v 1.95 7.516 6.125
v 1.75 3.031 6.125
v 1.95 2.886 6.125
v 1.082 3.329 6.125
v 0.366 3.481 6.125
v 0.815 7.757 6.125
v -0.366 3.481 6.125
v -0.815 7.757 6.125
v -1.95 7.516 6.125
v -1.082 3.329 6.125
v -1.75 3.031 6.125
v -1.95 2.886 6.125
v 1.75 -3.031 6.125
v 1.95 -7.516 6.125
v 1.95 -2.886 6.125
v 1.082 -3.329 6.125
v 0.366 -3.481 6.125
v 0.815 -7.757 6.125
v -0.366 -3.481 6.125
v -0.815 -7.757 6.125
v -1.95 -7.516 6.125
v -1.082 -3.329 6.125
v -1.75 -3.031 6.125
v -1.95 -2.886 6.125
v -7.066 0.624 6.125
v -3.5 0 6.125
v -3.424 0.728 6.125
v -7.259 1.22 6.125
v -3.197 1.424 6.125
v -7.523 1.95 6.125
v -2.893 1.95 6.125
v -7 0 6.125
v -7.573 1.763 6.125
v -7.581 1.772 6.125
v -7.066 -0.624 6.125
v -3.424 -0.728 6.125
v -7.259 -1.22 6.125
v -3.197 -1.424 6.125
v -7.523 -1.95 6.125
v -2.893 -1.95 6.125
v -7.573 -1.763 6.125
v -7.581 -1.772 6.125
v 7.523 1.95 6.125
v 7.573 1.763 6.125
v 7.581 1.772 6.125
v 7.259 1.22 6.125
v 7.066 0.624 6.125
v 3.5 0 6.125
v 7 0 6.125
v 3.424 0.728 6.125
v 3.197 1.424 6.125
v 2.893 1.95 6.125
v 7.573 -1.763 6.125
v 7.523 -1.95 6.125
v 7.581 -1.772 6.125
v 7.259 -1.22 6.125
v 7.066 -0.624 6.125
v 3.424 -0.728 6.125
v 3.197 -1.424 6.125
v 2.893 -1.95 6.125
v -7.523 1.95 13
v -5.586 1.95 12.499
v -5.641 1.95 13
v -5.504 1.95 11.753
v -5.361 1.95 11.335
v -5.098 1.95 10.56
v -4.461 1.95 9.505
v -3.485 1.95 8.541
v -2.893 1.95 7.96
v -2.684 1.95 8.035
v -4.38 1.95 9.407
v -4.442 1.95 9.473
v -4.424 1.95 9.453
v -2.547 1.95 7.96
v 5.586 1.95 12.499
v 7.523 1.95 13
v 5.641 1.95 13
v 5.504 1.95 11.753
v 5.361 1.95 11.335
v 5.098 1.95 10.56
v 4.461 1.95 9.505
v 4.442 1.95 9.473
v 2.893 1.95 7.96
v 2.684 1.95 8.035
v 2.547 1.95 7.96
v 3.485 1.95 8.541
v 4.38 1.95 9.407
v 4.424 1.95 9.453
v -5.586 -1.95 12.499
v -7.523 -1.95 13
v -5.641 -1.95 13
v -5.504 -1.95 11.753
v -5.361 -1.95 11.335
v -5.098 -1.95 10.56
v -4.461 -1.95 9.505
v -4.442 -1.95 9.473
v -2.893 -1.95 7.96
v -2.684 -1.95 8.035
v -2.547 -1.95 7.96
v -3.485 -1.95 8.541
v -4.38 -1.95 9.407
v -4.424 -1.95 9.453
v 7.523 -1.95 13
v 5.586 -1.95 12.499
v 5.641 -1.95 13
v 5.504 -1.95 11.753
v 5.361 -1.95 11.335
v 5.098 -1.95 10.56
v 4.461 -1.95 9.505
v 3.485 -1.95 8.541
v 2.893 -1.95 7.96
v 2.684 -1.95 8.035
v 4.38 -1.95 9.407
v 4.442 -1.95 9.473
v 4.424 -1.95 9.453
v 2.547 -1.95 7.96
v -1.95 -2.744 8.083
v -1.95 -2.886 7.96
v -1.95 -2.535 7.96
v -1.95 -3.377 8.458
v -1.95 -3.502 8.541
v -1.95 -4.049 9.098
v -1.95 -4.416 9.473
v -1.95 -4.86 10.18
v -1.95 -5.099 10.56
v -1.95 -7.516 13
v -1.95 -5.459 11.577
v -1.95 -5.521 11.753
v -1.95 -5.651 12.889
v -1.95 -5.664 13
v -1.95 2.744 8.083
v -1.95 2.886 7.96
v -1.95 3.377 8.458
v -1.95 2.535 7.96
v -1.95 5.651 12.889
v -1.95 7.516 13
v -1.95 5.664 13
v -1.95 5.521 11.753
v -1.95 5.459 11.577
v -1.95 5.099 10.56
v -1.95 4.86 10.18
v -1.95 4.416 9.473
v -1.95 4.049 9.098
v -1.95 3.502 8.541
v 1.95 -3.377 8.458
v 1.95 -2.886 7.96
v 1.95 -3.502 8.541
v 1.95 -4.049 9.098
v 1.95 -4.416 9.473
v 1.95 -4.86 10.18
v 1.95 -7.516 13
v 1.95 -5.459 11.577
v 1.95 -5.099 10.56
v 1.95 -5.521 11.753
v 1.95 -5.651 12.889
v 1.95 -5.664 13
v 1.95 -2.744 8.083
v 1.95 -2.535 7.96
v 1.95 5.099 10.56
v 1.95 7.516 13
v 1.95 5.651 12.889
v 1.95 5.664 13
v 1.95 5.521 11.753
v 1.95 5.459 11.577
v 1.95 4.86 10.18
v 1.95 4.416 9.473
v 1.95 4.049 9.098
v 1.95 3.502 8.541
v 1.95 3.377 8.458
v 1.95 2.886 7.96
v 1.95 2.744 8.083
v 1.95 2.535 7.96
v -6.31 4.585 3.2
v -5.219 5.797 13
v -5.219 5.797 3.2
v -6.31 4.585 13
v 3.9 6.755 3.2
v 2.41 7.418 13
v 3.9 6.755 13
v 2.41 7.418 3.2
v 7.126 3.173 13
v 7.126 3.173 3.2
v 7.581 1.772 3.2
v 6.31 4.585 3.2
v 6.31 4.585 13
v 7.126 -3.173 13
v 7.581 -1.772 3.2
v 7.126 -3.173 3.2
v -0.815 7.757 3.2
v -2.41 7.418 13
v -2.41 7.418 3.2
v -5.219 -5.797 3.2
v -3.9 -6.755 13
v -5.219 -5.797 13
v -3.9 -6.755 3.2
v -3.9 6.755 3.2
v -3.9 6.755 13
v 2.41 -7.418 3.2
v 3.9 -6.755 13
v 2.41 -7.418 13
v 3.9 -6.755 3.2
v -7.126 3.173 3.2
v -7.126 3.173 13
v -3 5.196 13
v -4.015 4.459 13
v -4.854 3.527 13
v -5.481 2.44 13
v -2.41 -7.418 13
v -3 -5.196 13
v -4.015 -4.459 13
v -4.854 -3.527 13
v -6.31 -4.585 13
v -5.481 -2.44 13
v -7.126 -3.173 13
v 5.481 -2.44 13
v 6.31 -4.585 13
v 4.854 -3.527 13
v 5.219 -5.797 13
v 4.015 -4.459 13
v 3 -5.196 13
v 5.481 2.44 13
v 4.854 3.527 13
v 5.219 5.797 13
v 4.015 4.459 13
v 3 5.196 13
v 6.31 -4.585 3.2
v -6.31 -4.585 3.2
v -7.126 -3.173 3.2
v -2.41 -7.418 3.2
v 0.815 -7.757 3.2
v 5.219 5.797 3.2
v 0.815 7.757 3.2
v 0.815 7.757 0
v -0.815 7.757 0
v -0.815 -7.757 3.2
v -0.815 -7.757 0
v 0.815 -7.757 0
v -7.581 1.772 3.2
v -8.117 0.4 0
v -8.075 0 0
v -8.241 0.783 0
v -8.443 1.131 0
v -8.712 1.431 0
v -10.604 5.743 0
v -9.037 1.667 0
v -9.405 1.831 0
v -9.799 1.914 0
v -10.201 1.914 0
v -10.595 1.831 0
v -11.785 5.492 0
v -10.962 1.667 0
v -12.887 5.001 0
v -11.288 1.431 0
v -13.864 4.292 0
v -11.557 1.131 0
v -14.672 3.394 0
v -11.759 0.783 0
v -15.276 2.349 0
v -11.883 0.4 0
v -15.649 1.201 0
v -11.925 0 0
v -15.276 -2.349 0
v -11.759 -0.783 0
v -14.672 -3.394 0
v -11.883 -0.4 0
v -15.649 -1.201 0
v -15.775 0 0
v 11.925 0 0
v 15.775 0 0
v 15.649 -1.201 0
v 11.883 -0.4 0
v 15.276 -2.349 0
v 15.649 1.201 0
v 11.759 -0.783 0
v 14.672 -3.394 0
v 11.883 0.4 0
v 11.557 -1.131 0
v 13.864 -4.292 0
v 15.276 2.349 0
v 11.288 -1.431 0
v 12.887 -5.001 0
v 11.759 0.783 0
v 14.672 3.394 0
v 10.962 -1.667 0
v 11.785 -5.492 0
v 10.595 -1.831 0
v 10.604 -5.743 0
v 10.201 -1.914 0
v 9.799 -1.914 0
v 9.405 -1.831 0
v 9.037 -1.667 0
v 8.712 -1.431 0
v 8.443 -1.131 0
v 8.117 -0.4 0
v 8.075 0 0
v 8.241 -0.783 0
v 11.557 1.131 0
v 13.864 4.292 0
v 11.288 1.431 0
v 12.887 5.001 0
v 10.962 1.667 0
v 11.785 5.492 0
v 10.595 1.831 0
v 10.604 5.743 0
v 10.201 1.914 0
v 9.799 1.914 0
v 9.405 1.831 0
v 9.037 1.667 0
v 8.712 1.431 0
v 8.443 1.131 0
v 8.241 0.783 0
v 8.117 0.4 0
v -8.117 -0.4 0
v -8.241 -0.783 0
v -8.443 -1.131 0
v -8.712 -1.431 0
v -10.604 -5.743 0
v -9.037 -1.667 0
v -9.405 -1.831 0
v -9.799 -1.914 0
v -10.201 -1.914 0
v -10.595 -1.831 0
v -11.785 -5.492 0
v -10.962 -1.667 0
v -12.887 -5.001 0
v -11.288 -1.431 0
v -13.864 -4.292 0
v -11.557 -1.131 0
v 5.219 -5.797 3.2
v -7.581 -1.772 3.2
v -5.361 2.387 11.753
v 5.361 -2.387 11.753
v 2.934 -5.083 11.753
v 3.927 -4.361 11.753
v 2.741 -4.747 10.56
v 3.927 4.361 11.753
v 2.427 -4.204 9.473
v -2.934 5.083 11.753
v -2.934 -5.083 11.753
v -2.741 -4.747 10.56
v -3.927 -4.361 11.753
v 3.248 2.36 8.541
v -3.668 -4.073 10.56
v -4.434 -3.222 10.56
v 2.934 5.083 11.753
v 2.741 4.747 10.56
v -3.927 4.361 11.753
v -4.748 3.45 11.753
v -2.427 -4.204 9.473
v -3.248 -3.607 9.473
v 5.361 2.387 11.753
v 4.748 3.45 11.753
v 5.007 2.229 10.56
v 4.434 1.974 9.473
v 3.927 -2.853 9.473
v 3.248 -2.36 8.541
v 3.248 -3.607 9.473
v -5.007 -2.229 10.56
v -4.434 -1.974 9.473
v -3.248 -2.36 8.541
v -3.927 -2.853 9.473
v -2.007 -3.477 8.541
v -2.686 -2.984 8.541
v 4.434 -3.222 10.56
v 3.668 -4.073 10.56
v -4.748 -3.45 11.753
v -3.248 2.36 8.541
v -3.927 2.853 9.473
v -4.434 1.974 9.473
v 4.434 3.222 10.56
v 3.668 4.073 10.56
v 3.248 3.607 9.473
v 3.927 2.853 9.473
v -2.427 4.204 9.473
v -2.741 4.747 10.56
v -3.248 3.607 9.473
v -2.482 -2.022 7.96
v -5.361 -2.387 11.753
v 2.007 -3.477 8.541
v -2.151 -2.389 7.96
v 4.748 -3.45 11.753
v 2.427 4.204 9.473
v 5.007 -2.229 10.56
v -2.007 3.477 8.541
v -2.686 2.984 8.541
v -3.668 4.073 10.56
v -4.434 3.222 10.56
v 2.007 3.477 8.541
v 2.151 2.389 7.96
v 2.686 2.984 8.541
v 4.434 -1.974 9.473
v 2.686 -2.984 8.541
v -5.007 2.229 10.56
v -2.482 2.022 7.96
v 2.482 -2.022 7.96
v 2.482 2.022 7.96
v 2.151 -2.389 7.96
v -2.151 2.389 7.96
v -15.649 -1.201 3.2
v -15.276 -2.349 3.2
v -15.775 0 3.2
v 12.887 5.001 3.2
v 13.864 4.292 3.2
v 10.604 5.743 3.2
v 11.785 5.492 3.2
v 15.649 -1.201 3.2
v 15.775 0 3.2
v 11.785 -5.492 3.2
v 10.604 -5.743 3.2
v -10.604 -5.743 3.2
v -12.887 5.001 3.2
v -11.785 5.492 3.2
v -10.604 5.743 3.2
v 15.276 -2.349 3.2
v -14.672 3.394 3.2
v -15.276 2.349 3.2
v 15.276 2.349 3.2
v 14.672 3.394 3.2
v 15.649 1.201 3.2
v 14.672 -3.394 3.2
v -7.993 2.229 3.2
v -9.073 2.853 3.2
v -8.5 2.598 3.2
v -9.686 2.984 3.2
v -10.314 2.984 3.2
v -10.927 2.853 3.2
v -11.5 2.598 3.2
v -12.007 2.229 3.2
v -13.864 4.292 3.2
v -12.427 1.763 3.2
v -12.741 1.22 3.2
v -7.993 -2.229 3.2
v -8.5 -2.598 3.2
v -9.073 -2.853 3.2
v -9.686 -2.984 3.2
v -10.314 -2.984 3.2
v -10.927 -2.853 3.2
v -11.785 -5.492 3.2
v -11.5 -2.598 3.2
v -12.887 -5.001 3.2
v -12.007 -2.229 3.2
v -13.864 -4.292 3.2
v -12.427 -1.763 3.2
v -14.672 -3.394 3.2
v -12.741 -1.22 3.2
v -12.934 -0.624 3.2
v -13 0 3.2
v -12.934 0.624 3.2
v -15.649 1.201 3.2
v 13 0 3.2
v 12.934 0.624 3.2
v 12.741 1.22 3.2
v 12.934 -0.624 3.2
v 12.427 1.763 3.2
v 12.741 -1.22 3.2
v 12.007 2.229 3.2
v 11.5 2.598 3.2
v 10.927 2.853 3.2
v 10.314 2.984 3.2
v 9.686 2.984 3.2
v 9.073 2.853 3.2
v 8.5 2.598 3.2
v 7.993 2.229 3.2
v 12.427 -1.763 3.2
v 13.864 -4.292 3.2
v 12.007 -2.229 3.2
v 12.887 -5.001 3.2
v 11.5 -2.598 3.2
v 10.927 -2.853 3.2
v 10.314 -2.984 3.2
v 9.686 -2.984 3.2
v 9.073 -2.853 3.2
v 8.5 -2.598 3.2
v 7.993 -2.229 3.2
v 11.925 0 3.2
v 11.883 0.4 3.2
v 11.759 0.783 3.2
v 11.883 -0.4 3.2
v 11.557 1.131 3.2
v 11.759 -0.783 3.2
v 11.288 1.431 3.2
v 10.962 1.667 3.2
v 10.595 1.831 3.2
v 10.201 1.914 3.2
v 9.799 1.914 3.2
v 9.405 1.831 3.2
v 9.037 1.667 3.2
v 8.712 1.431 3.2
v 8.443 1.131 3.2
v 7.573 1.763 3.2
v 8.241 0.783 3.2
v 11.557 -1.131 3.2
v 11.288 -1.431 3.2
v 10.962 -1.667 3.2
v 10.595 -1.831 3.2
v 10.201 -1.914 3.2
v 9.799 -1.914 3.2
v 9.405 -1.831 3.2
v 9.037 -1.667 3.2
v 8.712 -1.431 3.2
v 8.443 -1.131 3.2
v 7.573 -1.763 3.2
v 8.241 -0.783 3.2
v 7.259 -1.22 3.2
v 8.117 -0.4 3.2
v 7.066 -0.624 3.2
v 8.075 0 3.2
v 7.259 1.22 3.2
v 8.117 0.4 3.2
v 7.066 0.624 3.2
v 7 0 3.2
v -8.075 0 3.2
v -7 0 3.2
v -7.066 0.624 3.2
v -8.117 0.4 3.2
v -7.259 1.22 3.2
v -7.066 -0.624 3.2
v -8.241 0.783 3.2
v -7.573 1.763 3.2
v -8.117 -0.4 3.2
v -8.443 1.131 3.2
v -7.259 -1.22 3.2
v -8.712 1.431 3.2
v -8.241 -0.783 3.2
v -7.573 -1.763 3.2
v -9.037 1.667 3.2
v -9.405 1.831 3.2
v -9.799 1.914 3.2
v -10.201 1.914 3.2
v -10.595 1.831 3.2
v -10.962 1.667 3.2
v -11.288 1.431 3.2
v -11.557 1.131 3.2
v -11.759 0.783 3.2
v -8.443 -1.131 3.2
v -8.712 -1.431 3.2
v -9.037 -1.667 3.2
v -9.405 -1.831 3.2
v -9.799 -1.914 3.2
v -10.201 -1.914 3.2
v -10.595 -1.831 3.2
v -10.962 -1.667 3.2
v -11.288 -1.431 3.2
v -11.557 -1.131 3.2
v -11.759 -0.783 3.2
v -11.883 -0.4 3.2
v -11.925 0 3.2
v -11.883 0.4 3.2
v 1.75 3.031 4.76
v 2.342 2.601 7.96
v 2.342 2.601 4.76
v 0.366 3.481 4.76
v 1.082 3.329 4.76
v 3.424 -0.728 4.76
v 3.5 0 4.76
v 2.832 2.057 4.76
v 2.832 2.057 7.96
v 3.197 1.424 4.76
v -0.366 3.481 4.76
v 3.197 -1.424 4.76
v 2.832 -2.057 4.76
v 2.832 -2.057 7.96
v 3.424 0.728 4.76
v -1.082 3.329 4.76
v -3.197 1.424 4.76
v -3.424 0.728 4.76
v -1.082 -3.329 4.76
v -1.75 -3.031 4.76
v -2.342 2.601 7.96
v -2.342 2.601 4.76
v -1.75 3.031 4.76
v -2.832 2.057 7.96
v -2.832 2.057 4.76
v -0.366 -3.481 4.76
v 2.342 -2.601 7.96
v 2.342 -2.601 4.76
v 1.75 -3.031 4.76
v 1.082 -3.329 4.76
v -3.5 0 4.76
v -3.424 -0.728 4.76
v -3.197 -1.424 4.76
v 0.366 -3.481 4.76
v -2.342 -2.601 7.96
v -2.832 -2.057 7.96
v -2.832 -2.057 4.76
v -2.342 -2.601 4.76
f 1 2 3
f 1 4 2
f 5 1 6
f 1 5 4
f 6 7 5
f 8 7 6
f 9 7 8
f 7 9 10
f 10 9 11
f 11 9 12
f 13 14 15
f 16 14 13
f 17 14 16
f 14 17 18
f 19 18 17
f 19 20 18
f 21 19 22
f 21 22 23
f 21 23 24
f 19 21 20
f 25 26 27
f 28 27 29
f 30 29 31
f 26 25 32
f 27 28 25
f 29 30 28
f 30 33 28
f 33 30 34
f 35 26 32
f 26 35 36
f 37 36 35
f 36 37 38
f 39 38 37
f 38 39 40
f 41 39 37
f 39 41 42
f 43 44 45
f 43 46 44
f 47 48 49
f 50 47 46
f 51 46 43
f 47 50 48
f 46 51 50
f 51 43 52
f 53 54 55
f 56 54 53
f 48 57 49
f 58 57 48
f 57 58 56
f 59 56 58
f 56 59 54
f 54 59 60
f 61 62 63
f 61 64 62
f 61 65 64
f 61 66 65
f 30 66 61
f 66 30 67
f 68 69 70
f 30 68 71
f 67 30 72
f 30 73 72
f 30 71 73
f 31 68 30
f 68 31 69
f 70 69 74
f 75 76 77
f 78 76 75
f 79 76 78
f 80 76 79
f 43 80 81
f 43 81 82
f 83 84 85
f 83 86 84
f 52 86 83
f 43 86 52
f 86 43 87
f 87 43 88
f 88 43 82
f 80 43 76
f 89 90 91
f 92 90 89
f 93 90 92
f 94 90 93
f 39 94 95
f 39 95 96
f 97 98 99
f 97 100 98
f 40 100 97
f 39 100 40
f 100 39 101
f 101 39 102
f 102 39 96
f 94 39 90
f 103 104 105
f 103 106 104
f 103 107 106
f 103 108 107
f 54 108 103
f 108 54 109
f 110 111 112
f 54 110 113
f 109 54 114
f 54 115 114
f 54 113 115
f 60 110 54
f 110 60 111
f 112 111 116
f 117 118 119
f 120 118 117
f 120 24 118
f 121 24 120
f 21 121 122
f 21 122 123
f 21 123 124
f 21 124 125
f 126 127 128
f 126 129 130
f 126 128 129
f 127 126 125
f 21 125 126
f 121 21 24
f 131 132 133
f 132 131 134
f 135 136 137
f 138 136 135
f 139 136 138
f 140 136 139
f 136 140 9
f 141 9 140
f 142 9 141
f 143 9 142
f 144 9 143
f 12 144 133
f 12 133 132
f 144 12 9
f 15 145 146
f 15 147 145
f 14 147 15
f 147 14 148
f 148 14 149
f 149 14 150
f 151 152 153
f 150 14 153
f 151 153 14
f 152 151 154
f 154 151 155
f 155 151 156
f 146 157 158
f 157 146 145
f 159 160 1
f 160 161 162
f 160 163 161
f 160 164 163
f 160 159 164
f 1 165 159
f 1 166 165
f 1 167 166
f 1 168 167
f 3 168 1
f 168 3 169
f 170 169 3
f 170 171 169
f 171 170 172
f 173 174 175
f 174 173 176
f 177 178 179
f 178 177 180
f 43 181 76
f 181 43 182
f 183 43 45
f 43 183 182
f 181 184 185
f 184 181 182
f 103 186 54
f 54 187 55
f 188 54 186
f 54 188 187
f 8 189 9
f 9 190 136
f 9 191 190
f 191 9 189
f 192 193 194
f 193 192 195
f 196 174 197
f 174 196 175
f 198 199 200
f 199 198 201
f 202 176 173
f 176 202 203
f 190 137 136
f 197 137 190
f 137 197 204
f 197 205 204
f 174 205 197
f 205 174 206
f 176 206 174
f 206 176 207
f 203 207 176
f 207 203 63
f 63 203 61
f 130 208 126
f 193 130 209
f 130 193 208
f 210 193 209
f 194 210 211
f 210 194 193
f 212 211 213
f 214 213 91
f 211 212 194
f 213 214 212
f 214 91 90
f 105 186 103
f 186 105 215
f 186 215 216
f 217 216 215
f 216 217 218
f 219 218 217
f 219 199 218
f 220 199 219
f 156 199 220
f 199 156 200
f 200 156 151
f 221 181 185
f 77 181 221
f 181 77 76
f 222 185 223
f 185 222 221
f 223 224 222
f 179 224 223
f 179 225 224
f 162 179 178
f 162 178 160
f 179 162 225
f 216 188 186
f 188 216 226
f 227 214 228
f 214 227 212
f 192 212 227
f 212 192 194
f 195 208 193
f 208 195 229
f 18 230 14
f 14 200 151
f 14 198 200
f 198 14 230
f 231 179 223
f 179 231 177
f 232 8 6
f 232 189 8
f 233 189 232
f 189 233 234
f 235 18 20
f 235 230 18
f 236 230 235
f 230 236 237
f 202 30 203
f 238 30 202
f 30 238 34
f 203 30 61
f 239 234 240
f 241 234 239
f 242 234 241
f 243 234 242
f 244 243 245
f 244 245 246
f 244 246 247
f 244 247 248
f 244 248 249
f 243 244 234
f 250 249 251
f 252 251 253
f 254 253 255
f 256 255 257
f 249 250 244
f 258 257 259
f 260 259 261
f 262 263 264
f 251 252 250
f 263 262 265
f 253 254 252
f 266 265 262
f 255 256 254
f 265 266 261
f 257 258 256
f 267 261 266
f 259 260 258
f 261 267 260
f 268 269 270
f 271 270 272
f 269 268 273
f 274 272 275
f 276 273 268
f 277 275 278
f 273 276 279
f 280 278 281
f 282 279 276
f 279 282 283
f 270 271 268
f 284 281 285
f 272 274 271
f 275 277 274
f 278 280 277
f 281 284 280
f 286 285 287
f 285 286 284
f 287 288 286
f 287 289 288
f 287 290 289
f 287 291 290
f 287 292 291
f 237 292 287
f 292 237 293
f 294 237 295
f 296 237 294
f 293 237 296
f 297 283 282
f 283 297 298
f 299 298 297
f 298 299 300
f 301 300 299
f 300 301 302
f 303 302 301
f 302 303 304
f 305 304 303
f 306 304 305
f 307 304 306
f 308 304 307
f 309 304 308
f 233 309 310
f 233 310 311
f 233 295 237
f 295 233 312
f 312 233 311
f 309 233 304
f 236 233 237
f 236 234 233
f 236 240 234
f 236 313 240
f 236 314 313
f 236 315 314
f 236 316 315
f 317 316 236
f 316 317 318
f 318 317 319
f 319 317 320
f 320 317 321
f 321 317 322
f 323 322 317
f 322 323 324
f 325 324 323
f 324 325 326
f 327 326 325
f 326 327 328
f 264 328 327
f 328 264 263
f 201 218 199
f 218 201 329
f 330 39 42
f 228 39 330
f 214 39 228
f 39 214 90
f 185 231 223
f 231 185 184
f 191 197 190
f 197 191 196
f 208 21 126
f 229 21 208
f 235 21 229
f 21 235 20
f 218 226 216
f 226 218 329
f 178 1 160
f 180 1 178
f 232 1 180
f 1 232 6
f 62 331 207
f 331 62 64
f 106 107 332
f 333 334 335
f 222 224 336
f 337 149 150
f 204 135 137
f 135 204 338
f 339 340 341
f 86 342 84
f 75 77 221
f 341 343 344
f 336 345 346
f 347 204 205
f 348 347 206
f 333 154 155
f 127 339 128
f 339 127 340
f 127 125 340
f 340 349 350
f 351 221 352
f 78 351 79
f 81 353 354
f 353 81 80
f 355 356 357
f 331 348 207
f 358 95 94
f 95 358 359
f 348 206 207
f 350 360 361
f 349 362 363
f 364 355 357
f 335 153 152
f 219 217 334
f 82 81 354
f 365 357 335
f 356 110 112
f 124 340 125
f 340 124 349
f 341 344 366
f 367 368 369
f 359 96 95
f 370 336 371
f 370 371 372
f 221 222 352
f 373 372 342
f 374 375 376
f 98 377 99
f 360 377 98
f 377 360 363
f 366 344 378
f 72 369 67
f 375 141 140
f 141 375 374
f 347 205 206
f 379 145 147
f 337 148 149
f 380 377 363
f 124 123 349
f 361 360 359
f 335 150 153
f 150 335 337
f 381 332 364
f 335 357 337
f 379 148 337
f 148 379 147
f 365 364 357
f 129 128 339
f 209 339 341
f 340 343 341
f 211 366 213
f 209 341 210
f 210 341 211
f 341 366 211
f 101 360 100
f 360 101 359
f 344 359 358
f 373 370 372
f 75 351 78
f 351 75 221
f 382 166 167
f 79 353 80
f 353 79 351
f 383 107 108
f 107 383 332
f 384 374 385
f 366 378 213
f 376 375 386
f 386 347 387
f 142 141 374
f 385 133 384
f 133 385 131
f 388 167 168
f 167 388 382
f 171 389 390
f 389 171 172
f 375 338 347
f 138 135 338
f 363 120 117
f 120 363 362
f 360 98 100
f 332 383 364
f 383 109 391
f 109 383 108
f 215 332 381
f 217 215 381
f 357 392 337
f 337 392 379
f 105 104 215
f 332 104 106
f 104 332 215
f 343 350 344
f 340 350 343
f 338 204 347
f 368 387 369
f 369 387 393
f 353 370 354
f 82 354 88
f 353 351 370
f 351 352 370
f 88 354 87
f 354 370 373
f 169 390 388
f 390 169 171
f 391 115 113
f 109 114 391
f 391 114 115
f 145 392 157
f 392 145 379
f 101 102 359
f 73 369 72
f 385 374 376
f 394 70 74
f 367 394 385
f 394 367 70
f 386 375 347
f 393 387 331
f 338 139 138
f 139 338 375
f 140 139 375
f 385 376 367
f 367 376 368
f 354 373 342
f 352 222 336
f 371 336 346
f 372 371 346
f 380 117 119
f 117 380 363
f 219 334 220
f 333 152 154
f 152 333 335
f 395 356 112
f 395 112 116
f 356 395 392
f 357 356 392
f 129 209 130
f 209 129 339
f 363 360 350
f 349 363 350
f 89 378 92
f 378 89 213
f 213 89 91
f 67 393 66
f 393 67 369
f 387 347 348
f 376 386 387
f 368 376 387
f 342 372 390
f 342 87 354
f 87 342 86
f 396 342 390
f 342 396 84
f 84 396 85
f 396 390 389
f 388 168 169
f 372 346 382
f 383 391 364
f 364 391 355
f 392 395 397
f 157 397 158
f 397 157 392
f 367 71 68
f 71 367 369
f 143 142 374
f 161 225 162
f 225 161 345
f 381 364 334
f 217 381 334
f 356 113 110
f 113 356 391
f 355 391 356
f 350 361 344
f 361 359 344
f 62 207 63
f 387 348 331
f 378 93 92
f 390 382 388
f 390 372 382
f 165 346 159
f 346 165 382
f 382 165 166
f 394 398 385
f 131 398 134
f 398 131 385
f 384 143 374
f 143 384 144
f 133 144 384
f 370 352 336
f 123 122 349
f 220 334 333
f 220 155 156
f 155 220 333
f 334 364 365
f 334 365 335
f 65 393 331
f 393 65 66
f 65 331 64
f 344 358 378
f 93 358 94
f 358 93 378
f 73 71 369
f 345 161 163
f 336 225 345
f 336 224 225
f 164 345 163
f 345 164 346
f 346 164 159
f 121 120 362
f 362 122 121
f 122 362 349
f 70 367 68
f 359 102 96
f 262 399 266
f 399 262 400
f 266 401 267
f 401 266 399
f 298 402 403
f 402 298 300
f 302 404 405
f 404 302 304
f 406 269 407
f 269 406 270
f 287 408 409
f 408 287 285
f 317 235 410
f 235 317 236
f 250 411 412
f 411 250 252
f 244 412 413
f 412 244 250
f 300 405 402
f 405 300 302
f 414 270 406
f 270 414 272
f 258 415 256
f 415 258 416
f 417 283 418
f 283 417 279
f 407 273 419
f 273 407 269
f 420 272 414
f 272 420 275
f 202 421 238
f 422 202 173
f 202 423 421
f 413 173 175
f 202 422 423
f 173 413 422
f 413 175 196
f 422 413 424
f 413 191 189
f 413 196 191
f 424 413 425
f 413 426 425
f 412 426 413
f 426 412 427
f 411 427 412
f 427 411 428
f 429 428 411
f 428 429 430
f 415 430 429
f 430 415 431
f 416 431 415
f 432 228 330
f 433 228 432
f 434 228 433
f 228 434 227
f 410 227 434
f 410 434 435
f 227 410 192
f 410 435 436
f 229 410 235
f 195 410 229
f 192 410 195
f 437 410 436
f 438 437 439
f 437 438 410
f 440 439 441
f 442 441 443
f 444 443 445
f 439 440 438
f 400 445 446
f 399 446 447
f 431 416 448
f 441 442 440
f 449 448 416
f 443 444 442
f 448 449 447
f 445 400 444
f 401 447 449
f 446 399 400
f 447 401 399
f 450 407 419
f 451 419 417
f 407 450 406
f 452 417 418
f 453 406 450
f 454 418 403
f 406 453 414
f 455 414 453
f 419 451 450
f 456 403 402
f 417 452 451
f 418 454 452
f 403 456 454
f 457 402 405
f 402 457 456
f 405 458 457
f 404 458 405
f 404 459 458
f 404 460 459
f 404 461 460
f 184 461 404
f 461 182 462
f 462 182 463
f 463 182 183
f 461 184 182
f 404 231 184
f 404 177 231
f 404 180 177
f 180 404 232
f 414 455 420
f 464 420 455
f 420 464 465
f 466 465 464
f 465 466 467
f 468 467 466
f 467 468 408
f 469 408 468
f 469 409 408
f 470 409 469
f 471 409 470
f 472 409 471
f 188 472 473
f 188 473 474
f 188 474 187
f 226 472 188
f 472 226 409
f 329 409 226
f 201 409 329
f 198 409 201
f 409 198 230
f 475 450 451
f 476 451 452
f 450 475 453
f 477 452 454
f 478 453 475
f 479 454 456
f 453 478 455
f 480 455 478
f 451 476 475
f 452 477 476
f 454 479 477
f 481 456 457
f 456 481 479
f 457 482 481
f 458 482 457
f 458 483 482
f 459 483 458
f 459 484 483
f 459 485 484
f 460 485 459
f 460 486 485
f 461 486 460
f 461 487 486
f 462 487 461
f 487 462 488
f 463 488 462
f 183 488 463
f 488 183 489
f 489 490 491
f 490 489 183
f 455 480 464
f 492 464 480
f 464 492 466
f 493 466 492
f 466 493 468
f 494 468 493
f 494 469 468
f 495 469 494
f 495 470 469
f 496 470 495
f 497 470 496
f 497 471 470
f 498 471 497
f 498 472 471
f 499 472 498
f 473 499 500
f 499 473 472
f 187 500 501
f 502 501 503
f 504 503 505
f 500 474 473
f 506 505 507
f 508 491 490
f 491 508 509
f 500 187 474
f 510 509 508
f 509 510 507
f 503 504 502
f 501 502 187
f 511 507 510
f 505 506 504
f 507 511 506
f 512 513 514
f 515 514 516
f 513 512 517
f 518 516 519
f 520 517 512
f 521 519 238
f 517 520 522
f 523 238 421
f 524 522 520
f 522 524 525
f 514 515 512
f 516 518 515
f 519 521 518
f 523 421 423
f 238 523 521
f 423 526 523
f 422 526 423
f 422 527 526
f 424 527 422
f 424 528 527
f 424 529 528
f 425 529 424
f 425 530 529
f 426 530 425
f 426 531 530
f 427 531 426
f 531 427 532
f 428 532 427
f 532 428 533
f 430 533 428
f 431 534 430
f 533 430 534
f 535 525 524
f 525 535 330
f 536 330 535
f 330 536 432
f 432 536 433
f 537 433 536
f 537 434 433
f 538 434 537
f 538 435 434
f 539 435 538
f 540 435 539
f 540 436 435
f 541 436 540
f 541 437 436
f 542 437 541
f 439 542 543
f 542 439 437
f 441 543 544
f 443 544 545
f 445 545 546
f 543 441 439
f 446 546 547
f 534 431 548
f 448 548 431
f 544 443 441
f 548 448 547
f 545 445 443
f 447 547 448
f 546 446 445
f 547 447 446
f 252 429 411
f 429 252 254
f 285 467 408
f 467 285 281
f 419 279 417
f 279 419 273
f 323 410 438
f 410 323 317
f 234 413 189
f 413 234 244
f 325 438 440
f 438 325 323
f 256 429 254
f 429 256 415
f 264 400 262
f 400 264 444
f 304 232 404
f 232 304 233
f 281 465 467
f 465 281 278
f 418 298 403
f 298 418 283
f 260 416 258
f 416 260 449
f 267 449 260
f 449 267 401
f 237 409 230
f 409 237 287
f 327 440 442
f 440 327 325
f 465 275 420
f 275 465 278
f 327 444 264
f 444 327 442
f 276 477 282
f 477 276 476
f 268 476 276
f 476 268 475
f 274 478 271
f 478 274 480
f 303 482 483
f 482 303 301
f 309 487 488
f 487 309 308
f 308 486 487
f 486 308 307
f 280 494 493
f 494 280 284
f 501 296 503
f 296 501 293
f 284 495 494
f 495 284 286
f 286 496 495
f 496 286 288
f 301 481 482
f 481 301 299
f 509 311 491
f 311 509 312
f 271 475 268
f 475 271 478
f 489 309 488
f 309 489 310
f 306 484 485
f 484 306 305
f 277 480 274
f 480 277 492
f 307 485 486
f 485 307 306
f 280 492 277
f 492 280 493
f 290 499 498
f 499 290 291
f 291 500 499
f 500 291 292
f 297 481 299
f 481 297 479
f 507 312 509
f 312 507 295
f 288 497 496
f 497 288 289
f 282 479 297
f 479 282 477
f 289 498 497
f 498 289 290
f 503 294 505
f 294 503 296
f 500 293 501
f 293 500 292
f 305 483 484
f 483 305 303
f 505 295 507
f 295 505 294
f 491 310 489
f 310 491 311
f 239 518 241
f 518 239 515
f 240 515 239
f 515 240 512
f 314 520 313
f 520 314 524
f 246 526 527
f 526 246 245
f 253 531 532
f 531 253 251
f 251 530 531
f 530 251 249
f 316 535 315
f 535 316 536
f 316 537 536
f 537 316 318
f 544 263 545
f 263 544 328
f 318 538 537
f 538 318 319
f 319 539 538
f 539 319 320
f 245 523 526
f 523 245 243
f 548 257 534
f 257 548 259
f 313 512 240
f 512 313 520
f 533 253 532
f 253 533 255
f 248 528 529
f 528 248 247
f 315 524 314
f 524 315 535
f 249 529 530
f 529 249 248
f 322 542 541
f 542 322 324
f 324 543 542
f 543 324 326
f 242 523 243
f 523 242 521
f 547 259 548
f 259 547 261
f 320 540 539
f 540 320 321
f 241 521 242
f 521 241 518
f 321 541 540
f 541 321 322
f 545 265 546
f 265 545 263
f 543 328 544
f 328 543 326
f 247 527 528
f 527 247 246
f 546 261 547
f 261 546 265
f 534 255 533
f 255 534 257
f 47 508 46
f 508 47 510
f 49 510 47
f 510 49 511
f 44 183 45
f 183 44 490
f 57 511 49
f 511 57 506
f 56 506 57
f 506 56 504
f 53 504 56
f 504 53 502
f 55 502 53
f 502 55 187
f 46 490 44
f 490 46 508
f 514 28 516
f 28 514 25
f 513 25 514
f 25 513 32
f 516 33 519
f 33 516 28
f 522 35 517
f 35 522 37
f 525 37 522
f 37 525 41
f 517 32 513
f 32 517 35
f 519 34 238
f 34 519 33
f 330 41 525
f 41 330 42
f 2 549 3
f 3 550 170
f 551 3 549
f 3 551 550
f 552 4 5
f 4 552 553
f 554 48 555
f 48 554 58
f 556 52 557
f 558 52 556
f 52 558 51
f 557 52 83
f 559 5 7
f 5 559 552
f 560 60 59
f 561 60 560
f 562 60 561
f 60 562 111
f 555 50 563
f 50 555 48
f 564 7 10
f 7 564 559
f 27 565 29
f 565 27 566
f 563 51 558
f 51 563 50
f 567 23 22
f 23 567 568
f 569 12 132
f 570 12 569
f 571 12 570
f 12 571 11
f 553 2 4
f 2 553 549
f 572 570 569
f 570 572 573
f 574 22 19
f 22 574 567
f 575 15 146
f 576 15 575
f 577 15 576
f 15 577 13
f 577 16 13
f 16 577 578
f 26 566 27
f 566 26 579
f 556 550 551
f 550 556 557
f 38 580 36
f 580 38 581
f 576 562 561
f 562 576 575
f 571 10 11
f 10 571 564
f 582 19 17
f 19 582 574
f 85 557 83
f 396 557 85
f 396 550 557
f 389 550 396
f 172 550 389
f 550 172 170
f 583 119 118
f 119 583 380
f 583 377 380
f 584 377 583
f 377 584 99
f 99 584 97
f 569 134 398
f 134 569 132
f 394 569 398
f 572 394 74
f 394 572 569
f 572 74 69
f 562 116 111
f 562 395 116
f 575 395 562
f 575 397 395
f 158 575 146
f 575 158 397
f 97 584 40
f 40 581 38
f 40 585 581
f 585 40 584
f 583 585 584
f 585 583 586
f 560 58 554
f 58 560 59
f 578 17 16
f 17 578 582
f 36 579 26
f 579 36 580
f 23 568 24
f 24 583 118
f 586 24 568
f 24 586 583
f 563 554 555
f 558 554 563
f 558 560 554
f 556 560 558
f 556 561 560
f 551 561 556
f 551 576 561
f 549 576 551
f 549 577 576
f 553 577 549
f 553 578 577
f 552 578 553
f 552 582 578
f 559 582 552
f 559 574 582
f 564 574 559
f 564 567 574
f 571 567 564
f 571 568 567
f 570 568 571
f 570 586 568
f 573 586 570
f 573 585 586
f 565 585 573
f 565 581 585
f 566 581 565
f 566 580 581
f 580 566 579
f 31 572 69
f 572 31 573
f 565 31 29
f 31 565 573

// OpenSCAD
// file: metric_screw_sizes.scad
//sizes for metric screws that work
m3_clearance = 3.85;
m3_tight = 3.5;
m3_cap_clear = 6;
m3_cap_depth = 3.3;
m3_nut_clear = 7;
m3_nut_depth = 2.3;

// insert hole sizes < diameter of insert
m2_insert = 3.2;
m2_clearance = 2.1;
// main file
include <metric_screw_sizes.scad>
WallThickness = 1.8;
$fn=30;
//BallSize = 13; te ruim
//BallSize = 12.7; bijna
//BallSize = 12.4;goed
BallSize = 11.;
Airgap = .5;
Mount = 3.2; //10 layers at 0.32
TotalHeight =  18+Airgap; 		//this includes the ball
MountScrewRad = m3_clearance/2;  	//3mm screw
BallProtrude = .50; 	//percentage of ball radius sticking out 
ScrewSpacing = 20;		//spaceing of the mountholes center to center
MountMiddle = false; 	//mount int the center
MountBase = true;		//use mount base 2 holes


cylrad = (BallSize/2) + WallThickness + Airgap;
echo (cylrad);


    difference()
    {
        union()
        {
            ball_mount ();
            if(MountBase)
            {		
                base();
            }  
  
        }
        if(MountMiddle)
        {
            cylinder(r1 = MountScrewRad, r2 = MountScrewRad, h= TotalHeight,center=true, $fn=30);
            translate([0,0,(TotalHeight-BallSize)/2]) 
            {
                cylinder(r1 = MountScrewRad*2, r2 = MountScrewRad*2, h= TotalHeight, $fn=30);
            }
        }
        //tunnels to clear screw caps
        translate([ScrewSpacing/2, 0, Mount])
            cylinder(h = TotalHeight, r = m3_cap_clear/2);
        translate([-ScrewSpacing/2, 0, Mount]) 
            cylinder(h = TotalHeight, r = m3_cap_clear/2);
        //magnet pocket, 2 0.32 mm layers under, magnet is 1.6mm thick, 6mm diameter
        echo(TotalHeight-BallSize-Airgap-1.6);
        echo(TotalHeight-(BallSize + Airgap));
        translate([0, 0, TotalHeight-BallSize-Airgap-2.24])
            #cylinder(h = 10*0.32, r = 3.5);   
    }

module ball_mount ()
{
	difference () 
	{
		cylinder(r1 = cylrad , r2 = cylrad,  TotalHeight - (BallSize*BallProtrude));
	
		translate([0,0,TotalHeight - BallSize/2]) 
		{
			cube(size = [cylrad*2+5, cylrad/2, BallSize*1.25], center = true );
			rotate([0,0,90]) cube(size = [cylrad*2+5, cylrad/2, BallSize*1.25], center = true );
		}
	
		translate([0,0,TotalHeight - (BallSize/2)]) 
		{
			sphere (BallSize/2+Airgap, $fa=5, $fs=0.1);
		}
	}
}
module base()
{
	difference (){
		linear_extrude(height=Mount)
		hull() {
			translate([ScrewSpacing/2,0,0]) {
				circle(  MountScrewRad*3);
			}
			translate([0-ScrewSpacing/2,0,0]) {
				circle( MountScrewRad*3);
			}
			circle( cylrad);
		}
	
		translate([ScrewSpacing/2,0,-1]) {
			#cylinder(r1 = MountScrewRad, r2 = MountScrewRad, h= Mount+2,$fn=30);
		}
		translate([0-ScrewSpacing/2,0,-1]) {
			#cylinder(r1 = MountScrewRad, r2 = MountScrewRad, h= Mount+2,$fn=30);
			
		}

	}
}
